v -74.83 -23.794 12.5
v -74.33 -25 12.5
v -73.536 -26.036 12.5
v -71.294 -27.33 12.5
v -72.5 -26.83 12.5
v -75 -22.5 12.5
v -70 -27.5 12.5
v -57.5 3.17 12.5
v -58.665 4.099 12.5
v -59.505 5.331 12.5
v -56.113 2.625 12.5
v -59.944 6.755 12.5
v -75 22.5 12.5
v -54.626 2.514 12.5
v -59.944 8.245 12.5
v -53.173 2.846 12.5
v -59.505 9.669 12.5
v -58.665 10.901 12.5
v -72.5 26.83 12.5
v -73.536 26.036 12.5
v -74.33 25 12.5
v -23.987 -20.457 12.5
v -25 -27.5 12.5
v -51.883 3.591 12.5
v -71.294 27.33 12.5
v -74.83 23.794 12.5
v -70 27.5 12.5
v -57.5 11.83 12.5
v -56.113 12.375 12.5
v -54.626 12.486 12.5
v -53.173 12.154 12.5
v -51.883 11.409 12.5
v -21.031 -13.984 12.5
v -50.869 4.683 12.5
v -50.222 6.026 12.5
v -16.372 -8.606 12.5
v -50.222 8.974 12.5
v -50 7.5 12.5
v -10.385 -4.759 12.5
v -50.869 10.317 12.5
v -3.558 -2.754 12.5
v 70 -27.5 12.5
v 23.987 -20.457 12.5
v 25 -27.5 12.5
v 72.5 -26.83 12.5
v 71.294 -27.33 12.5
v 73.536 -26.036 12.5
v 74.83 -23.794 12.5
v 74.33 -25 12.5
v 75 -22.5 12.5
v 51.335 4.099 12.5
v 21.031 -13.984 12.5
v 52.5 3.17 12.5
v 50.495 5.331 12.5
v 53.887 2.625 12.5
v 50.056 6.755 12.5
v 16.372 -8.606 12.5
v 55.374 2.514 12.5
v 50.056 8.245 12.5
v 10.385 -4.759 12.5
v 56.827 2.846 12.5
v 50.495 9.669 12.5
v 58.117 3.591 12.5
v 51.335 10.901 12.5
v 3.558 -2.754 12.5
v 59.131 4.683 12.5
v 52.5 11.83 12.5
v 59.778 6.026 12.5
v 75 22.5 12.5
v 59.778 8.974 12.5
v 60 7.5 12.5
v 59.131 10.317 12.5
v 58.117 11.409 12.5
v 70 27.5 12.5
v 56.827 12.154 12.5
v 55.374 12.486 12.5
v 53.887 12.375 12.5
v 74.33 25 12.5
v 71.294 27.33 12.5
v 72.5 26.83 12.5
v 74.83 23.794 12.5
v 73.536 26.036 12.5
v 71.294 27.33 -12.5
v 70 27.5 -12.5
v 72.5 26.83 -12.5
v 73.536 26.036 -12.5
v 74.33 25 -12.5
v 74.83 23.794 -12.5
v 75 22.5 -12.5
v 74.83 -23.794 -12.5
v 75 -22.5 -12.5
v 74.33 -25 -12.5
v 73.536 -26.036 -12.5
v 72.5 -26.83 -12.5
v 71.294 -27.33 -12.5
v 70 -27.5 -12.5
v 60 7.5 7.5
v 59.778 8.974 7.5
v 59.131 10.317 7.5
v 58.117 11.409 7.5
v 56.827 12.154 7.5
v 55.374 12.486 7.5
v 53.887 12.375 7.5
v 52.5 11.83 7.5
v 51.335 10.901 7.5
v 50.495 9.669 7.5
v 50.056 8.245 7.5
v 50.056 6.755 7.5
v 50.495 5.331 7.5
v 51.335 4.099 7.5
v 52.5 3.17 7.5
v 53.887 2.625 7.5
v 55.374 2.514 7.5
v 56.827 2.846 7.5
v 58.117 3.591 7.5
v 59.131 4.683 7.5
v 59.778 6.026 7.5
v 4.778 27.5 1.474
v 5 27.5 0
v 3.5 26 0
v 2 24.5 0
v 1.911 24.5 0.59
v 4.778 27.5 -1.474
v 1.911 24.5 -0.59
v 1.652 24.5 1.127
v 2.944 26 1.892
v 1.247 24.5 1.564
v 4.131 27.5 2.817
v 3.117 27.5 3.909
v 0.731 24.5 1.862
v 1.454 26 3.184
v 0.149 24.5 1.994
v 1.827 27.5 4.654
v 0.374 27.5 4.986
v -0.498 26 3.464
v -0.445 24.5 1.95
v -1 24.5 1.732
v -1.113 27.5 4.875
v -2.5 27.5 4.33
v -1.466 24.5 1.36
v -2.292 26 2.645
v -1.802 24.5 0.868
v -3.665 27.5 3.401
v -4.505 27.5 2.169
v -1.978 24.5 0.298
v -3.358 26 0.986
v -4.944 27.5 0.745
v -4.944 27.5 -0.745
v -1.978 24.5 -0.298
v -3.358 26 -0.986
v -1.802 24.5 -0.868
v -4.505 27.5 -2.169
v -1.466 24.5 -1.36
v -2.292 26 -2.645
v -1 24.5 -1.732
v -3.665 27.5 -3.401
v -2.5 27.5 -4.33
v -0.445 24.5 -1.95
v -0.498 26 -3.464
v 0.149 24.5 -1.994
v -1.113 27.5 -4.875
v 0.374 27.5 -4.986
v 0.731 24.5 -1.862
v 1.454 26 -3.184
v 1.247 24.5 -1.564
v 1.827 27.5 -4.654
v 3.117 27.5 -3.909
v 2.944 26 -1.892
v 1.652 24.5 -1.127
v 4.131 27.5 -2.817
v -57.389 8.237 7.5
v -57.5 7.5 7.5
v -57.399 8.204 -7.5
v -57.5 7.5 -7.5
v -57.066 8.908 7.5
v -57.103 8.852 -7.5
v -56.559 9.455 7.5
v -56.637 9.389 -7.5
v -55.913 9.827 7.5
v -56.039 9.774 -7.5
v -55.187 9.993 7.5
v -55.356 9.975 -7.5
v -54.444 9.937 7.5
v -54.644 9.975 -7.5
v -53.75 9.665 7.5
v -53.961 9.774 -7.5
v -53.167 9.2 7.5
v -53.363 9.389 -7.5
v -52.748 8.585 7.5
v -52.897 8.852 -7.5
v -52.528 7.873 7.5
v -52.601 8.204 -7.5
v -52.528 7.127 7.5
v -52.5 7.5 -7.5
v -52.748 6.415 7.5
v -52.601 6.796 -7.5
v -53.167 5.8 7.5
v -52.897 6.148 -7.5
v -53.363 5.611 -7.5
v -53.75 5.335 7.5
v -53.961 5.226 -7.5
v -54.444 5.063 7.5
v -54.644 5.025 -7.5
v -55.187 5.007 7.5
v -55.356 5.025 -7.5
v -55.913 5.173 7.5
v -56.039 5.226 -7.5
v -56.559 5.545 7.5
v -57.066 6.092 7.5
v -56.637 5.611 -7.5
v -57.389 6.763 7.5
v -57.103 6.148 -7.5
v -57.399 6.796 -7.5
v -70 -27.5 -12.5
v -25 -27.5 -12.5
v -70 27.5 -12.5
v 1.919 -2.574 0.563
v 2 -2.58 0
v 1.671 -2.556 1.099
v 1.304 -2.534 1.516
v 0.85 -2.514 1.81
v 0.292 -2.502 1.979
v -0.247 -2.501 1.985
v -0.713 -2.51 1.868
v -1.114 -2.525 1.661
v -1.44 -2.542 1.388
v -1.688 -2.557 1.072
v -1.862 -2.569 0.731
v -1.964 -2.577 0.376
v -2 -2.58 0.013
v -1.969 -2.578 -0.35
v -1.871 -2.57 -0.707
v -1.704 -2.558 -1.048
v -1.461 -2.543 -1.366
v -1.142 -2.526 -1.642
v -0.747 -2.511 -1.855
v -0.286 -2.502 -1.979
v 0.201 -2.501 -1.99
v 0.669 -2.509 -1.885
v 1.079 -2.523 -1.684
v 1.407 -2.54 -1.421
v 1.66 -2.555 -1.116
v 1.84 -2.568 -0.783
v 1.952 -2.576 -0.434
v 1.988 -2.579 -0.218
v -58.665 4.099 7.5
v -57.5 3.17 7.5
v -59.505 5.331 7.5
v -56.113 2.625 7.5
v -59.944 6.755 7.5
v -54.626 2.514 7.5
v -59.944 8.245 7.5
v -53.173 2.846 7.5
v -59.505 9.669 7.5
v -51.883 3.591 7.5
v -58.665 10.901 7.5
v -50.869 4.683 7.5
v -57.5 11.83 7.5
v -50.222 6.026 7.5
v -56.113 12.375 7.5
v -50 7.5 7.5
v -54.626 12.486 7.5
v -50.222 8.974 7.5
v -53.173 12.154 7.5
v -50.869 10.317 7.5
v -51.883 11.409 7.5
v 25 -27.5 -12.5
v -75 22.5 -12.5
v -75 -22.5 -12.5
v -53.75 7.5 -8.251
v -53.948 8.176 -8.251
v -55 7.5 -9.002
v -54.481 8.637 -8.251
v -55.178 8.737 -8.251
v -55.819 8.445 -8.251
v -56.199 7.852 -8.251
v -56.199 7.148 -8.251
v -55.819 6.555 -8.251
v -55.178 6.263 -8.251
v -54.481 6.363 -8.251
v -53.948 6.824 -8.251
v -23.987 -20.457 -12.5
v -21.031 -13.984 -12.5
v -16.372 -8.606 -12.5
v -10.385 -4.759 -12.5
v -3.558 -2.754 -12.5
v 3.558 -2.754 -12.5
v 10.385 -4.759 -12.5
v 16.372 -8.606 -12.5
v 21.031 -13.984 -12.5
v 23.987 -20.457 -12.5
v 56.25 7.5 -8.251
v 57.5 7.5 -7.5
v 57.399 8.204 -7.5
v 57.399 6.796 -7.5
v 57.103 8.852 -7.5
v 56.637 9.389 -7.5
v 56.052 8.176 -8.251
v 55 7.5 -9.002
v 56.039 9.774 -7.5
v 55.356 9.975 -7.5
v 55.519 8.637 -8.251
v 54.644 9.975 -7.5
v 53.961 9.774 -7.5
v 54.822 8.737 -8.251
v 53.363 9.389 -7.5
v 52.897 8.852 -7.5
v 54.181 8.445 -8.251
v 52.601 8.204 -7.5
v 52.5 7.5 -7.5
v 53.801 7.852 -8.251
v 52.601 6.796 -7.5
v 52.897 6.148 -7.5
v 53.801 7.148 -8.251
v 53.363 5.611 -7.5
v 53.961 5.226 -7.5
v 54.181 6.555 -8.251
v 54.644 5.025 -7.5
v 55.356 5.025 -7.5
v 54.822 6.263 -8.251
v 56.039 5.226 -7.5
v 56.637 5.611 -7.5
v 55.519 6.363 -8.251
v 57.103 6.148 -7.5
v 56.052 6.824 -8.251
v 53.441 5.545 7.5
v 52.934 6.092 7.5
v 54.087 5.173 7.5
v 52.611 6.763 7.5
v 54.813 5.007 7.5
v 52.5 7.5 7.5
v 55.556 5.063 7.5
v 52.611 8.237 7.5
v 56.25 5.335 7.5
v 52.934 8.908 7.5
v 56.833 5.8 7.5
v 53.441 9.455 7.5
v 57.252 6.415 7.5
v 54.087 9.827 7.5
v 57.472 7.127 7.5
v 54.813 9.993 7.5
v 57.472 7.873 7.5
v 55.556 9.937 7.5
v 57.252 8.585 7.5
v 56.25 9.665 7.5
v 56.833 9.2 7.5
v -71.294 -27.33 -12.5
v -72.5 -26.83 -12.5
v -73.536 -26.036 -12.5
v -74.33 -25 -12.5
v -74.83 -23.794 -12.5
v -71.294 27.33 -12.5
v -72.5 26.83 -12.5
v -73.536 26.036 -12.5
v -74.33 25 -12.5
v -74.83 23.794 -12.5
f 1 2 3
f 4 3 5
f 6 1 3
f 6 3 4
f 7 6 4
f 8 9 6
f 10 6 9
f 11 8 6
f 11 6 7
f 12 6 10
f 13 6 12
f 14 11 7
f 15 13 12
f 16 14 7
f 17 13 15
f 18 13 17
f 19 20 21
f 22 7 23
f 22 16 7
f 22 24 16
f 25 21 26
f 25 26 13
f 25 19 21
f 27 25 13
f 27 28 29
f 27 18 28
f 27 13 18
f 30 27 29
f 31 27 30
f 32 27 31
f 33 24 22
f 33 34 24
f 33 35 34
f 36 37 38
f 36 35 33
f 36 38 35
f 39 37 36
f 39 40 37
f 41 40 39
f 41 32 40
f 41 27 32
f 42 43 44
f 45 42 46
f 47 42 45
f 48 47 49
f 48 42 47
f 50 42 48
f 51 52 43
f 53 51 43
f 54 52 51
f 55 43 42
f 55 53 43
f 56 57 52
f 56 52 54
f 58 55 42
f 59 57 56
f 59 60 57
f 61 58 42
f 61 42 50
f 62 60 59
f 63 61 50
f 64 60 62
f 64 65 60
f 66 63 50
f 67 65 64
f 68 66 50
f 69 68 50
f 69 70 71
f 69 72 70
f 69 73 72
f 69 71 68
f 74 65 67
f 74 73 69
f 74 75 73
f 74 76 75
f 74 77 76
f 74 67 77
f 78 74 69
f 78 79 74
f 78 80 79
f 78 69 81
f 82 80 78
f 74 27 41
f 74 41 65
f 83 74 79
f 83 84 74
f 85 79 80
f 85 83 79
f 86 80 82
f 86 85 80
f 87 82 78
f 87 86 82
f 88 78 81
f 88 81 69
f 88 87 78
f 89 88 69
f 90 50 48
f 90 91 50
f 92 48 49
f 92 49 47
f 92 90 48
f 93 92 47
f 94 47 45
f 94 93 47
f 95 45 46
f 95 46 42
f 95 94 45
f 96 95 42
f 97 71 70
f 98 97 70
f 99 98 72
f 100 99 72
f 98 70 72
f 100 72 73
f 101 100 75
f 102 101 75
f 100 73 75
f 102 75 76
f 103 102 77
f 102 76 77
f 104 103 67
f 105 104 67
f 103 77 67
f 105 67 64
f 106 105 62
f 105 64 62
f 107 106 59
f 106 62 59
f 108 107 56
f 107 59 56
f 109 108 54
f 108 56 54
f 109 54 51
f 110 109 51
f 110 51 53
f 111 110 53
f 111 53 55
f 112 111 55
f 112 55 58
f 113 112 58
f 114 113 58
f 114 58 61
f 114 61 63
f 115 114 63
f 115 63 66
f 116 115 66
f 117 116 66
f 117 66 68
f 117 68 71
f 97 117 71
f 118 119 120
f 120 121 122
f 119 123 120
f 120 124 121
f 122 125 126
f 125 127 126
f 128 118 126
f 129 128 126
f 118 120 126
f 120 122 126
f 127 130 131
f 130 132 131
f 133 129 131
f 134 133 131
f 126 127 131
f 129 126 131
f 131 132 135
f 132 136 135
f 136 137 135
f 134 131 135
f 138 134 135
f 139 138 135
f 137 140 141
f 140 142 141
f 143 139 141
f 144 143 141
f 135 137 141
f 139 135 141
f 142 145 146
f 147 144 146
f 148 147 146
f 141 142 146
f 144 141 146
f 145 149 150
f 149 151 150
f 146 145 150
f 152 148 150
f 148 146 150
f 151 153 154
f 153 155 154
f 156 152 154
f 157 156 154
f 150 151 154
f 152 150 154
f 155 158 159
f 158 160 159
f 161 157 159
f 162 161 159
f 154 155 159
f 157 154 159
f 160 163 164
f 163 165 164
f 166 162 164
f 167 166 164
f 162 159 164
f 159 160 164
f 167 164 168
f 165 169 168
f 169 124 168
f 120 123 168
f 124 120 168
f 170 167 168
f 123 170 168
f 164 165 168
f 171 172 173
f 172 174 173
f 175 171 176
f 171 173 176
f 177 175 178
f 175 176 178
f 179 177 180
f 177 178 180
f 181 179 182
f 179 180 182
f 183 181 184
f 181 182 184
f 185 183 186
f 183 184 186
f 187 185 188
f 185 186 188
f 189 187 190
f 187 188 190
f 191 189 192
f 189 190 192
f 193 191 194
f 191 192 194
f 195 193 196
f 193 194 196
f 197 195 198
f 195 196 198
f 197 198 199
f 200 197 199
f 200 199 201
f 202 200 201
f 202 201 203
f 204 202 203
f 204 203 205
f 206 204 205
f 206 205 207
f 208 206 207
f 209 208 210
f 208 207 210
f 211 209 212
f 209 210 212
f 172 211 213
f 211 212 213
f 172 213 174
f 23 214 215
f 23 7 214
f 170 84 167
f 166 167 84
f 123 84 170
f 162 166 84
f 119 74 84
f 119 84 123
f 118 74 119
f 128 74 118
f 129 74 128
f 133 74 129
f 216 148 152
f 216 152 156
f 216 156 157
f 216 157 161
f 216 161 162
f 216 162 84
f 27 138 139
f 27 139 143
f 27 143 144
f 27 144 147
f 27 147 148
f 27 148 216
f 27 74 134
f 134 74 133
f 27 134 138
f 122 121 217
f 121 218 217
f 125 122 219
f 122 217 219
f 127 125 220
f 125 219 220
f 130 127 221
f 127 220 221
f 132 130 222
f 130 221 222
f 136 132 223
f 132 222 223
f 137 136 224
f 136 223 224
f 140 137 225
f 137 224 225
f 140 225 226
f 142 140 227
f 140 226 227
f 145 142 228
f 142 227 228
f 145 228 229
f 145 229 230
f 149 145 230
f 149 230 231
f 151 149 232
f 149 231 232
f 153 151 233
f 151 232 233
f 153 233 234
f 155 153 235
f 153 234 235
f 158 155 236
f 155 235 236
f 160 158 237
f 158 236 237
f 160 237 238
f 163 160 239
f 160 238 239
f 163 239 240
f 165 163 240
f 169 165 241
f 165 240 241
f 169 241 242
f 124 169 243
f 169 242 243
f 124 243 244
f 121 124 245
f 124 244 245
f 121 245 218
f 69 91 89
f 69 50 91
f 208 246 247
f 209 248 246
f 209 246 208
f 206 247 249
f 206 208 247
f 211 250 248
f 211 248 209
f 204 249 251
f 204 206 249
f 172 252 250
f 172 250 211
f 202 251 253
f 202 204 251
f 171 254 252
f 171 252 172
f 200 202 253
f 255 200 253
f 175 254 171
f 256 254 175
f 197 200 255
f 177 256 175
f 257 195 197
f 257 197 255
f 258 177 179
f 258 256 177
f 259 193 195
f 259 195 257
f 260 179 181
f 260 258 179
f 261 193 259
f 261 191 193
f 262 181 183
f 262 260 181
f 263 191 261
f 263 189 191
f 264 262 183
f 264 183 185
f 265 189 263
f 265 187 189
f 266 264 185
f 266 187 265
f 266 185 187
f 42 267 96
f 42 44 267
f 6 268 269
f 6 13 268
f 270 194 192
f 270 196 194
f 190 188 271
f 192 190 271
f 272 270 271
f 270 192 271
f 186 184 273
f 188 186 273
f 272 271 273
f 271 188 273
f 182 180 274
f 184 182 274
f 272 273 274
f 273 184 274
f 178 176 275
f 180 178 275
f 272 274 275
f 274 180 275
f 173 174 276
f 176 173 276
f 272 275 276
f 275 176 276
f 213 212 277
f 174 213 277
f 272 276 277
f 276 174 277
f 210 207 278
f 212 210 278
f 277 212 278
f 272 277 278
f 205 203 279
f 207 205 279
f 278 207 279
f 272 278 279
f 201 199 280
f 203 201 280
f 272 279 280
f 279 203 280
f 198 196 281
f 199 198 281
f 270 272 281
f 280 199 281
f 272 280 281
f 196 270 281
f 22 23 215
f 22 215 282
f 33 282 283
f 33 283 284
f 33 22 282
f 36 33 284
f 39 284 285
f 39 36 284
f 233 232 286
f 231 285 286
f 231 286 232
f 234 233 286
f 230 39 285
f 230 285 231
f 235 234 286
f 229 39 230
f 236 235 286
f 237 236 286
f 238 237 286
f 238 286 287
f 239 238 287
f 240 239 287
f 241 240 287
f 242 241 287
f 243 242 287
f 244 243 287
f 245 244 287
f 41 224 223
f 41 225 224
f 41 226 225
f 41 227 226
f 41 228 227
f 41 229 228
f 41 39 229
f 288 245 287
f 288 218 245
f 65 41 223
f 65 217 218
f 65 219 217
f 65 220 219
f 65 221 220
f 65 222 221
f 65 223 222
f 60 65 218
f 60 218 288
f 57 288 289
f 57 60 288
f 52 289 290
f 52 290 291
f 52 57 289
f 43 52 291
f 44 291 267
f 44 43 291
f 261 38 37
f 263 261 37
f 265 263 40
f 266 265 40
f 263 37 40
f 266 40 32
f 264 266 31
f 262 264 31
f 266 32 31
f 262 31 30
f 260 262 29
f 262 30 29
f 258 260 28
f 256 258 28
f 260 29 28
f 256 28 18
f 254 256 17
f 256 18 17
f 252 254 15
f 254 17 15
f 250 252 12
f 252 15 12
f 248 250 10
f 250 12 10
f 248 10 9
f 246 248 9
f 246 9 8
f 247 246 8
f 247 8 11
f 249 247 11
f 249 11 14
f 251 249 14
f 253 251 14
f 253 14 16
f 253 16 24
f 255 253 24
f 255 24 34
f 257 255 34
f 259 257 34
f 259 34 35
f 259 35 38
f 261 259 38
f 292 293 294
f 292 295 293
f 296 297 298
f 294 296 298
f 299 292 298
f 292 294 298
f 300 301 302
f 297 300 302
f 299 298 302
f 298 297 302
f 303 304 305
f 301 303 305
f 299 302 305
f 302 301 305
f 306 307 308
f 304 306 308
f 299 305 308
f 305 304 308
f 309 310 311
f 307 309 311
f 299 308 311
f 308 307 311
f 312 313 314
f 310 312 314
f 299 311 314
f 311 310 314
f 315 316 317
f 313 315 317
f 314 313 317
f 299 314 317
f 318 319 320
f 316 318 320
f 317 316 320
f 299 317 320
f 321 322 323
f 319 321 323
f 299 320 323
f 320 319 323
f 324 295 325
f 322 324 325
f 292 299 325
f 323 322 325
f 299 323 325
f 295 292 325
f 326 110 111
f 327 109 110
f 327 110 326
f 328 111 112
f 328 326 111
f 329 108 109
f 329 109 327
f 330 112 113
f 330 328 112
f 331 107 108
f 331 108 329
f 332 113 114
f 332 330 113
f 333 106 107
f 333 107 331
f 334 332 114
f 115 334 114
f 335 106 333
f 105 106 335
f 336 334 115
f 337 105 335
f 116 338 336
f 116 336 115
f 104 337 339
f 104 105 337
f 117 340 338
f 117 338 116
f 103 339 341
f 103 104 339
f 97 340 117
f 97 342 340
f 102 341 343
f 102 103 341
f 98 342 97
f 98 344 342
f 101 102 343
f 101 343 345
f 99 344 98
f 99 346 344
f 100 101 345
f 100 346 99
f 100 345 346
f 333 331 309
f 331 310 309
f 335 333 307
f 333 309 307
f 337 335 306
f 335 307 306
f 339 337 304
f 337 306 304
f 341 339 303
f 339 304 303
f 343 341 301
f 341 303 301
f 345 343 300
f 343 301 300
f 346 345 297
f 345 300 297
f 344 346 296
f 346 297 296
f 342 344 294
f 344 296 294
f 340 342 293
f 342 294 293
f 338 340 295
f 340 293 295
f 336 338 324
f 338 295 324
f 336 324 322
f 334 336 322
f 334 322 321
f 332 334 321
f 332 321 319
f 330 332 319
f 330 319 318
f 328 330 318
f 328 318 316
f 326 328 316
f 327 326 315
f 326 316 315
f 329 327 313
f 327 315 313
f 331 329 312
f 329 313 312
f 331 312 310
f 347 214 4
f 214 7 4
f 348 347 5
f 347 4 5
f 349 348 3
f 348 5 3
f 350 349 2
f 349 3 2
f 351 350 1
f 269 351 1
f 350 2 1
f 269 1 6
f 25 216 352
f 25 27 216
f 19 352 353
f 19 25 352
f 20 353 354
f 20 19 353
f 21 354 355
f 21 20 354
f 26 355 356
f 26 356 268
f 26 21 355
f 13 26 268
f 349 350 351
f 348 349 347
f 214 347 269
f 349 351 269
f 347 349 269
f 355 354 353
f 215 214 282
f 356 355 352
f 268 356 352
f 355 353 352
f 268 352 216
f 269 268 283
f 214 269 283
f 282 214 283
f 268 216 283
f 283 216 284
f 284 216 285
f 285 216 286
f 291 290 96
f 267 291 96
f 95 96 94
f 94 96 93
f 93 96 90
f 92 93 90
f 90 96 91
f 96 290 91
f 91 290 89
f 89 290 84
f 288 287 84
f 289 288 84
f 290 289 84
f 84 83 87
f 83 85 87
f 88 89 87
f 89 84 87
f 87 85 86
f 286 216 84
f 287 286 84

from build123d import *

# Parameters (mm, degrees)
F1_DEPTH       = 12.5
F2_R           = 5
F4_D           = 5
F4_DEPTH       = 20
F4_CBORE_D     = 10
F4_CBORE_DEPTH = 5
F4_TIP         = 1.5021515476
F6_D           = 4
F6_CSINK_D     = 10
F6_CSINK_ANGLE = 90


with BuildPart() as f1:
    # F0 (on Top) → F1 (new body, symmetric)
    with BuildSketch(Plane.XY):
        with BuildLine():
            Line((75, 27.5), (-75, 27.5))
            Line((-75, 27.5), (-75, -27.5))
            Line((-75, -27.5), (-25, -27.5))
            ThreePointArc((-25, -27.5), (0, -2.5), (25, -27.5))
            Line((25, -27.5), (75, -27.5))
            Line((75, -27.5), (75, 27.5))
        make_face()
    extrude(amount=F1_DEPTH, both=True)

    # F2
    f2_edges = [f1.edges().sort_by_distance(p)[0] for p in [
        (75, 27.5, 0),
        (-75, 27.5, 0),
        (-75, -27.5, 0),
        (75, -27.5, 0),
    ]]
    fillet(f2_edges, radius=F2_R)

    # F4
    with Locations(Plane.XY.offset(12.5)):
        with Locations((-55, 7.5), (55, 7.5)):
            CounterBoreHole(F4_D / 2, F4_CBORE_D / 2, F4_CBORE_DEPTH, depth=F4_DEPTH)
            with Locations((0, 0, -(F4_DEPTH + F4_TIP / 2))):  # 118° drill point
                Cone(0, F4_D / 2, F4_TIP, mode=Mode.SUBTRACT)

    # F6 (through all)
    with Locations(Plane(origin=(0, 27.5, 0), x_dir=(-1, 0, 0), z_dir=(0, 1, 0))):
        with Locations((0, 0)):
            CounterSinkHole(F6_D / 2, F6_CSINK_D / 2, counter_sink_angle=F6_CSINK_ANGLE)


solid = f1.part
